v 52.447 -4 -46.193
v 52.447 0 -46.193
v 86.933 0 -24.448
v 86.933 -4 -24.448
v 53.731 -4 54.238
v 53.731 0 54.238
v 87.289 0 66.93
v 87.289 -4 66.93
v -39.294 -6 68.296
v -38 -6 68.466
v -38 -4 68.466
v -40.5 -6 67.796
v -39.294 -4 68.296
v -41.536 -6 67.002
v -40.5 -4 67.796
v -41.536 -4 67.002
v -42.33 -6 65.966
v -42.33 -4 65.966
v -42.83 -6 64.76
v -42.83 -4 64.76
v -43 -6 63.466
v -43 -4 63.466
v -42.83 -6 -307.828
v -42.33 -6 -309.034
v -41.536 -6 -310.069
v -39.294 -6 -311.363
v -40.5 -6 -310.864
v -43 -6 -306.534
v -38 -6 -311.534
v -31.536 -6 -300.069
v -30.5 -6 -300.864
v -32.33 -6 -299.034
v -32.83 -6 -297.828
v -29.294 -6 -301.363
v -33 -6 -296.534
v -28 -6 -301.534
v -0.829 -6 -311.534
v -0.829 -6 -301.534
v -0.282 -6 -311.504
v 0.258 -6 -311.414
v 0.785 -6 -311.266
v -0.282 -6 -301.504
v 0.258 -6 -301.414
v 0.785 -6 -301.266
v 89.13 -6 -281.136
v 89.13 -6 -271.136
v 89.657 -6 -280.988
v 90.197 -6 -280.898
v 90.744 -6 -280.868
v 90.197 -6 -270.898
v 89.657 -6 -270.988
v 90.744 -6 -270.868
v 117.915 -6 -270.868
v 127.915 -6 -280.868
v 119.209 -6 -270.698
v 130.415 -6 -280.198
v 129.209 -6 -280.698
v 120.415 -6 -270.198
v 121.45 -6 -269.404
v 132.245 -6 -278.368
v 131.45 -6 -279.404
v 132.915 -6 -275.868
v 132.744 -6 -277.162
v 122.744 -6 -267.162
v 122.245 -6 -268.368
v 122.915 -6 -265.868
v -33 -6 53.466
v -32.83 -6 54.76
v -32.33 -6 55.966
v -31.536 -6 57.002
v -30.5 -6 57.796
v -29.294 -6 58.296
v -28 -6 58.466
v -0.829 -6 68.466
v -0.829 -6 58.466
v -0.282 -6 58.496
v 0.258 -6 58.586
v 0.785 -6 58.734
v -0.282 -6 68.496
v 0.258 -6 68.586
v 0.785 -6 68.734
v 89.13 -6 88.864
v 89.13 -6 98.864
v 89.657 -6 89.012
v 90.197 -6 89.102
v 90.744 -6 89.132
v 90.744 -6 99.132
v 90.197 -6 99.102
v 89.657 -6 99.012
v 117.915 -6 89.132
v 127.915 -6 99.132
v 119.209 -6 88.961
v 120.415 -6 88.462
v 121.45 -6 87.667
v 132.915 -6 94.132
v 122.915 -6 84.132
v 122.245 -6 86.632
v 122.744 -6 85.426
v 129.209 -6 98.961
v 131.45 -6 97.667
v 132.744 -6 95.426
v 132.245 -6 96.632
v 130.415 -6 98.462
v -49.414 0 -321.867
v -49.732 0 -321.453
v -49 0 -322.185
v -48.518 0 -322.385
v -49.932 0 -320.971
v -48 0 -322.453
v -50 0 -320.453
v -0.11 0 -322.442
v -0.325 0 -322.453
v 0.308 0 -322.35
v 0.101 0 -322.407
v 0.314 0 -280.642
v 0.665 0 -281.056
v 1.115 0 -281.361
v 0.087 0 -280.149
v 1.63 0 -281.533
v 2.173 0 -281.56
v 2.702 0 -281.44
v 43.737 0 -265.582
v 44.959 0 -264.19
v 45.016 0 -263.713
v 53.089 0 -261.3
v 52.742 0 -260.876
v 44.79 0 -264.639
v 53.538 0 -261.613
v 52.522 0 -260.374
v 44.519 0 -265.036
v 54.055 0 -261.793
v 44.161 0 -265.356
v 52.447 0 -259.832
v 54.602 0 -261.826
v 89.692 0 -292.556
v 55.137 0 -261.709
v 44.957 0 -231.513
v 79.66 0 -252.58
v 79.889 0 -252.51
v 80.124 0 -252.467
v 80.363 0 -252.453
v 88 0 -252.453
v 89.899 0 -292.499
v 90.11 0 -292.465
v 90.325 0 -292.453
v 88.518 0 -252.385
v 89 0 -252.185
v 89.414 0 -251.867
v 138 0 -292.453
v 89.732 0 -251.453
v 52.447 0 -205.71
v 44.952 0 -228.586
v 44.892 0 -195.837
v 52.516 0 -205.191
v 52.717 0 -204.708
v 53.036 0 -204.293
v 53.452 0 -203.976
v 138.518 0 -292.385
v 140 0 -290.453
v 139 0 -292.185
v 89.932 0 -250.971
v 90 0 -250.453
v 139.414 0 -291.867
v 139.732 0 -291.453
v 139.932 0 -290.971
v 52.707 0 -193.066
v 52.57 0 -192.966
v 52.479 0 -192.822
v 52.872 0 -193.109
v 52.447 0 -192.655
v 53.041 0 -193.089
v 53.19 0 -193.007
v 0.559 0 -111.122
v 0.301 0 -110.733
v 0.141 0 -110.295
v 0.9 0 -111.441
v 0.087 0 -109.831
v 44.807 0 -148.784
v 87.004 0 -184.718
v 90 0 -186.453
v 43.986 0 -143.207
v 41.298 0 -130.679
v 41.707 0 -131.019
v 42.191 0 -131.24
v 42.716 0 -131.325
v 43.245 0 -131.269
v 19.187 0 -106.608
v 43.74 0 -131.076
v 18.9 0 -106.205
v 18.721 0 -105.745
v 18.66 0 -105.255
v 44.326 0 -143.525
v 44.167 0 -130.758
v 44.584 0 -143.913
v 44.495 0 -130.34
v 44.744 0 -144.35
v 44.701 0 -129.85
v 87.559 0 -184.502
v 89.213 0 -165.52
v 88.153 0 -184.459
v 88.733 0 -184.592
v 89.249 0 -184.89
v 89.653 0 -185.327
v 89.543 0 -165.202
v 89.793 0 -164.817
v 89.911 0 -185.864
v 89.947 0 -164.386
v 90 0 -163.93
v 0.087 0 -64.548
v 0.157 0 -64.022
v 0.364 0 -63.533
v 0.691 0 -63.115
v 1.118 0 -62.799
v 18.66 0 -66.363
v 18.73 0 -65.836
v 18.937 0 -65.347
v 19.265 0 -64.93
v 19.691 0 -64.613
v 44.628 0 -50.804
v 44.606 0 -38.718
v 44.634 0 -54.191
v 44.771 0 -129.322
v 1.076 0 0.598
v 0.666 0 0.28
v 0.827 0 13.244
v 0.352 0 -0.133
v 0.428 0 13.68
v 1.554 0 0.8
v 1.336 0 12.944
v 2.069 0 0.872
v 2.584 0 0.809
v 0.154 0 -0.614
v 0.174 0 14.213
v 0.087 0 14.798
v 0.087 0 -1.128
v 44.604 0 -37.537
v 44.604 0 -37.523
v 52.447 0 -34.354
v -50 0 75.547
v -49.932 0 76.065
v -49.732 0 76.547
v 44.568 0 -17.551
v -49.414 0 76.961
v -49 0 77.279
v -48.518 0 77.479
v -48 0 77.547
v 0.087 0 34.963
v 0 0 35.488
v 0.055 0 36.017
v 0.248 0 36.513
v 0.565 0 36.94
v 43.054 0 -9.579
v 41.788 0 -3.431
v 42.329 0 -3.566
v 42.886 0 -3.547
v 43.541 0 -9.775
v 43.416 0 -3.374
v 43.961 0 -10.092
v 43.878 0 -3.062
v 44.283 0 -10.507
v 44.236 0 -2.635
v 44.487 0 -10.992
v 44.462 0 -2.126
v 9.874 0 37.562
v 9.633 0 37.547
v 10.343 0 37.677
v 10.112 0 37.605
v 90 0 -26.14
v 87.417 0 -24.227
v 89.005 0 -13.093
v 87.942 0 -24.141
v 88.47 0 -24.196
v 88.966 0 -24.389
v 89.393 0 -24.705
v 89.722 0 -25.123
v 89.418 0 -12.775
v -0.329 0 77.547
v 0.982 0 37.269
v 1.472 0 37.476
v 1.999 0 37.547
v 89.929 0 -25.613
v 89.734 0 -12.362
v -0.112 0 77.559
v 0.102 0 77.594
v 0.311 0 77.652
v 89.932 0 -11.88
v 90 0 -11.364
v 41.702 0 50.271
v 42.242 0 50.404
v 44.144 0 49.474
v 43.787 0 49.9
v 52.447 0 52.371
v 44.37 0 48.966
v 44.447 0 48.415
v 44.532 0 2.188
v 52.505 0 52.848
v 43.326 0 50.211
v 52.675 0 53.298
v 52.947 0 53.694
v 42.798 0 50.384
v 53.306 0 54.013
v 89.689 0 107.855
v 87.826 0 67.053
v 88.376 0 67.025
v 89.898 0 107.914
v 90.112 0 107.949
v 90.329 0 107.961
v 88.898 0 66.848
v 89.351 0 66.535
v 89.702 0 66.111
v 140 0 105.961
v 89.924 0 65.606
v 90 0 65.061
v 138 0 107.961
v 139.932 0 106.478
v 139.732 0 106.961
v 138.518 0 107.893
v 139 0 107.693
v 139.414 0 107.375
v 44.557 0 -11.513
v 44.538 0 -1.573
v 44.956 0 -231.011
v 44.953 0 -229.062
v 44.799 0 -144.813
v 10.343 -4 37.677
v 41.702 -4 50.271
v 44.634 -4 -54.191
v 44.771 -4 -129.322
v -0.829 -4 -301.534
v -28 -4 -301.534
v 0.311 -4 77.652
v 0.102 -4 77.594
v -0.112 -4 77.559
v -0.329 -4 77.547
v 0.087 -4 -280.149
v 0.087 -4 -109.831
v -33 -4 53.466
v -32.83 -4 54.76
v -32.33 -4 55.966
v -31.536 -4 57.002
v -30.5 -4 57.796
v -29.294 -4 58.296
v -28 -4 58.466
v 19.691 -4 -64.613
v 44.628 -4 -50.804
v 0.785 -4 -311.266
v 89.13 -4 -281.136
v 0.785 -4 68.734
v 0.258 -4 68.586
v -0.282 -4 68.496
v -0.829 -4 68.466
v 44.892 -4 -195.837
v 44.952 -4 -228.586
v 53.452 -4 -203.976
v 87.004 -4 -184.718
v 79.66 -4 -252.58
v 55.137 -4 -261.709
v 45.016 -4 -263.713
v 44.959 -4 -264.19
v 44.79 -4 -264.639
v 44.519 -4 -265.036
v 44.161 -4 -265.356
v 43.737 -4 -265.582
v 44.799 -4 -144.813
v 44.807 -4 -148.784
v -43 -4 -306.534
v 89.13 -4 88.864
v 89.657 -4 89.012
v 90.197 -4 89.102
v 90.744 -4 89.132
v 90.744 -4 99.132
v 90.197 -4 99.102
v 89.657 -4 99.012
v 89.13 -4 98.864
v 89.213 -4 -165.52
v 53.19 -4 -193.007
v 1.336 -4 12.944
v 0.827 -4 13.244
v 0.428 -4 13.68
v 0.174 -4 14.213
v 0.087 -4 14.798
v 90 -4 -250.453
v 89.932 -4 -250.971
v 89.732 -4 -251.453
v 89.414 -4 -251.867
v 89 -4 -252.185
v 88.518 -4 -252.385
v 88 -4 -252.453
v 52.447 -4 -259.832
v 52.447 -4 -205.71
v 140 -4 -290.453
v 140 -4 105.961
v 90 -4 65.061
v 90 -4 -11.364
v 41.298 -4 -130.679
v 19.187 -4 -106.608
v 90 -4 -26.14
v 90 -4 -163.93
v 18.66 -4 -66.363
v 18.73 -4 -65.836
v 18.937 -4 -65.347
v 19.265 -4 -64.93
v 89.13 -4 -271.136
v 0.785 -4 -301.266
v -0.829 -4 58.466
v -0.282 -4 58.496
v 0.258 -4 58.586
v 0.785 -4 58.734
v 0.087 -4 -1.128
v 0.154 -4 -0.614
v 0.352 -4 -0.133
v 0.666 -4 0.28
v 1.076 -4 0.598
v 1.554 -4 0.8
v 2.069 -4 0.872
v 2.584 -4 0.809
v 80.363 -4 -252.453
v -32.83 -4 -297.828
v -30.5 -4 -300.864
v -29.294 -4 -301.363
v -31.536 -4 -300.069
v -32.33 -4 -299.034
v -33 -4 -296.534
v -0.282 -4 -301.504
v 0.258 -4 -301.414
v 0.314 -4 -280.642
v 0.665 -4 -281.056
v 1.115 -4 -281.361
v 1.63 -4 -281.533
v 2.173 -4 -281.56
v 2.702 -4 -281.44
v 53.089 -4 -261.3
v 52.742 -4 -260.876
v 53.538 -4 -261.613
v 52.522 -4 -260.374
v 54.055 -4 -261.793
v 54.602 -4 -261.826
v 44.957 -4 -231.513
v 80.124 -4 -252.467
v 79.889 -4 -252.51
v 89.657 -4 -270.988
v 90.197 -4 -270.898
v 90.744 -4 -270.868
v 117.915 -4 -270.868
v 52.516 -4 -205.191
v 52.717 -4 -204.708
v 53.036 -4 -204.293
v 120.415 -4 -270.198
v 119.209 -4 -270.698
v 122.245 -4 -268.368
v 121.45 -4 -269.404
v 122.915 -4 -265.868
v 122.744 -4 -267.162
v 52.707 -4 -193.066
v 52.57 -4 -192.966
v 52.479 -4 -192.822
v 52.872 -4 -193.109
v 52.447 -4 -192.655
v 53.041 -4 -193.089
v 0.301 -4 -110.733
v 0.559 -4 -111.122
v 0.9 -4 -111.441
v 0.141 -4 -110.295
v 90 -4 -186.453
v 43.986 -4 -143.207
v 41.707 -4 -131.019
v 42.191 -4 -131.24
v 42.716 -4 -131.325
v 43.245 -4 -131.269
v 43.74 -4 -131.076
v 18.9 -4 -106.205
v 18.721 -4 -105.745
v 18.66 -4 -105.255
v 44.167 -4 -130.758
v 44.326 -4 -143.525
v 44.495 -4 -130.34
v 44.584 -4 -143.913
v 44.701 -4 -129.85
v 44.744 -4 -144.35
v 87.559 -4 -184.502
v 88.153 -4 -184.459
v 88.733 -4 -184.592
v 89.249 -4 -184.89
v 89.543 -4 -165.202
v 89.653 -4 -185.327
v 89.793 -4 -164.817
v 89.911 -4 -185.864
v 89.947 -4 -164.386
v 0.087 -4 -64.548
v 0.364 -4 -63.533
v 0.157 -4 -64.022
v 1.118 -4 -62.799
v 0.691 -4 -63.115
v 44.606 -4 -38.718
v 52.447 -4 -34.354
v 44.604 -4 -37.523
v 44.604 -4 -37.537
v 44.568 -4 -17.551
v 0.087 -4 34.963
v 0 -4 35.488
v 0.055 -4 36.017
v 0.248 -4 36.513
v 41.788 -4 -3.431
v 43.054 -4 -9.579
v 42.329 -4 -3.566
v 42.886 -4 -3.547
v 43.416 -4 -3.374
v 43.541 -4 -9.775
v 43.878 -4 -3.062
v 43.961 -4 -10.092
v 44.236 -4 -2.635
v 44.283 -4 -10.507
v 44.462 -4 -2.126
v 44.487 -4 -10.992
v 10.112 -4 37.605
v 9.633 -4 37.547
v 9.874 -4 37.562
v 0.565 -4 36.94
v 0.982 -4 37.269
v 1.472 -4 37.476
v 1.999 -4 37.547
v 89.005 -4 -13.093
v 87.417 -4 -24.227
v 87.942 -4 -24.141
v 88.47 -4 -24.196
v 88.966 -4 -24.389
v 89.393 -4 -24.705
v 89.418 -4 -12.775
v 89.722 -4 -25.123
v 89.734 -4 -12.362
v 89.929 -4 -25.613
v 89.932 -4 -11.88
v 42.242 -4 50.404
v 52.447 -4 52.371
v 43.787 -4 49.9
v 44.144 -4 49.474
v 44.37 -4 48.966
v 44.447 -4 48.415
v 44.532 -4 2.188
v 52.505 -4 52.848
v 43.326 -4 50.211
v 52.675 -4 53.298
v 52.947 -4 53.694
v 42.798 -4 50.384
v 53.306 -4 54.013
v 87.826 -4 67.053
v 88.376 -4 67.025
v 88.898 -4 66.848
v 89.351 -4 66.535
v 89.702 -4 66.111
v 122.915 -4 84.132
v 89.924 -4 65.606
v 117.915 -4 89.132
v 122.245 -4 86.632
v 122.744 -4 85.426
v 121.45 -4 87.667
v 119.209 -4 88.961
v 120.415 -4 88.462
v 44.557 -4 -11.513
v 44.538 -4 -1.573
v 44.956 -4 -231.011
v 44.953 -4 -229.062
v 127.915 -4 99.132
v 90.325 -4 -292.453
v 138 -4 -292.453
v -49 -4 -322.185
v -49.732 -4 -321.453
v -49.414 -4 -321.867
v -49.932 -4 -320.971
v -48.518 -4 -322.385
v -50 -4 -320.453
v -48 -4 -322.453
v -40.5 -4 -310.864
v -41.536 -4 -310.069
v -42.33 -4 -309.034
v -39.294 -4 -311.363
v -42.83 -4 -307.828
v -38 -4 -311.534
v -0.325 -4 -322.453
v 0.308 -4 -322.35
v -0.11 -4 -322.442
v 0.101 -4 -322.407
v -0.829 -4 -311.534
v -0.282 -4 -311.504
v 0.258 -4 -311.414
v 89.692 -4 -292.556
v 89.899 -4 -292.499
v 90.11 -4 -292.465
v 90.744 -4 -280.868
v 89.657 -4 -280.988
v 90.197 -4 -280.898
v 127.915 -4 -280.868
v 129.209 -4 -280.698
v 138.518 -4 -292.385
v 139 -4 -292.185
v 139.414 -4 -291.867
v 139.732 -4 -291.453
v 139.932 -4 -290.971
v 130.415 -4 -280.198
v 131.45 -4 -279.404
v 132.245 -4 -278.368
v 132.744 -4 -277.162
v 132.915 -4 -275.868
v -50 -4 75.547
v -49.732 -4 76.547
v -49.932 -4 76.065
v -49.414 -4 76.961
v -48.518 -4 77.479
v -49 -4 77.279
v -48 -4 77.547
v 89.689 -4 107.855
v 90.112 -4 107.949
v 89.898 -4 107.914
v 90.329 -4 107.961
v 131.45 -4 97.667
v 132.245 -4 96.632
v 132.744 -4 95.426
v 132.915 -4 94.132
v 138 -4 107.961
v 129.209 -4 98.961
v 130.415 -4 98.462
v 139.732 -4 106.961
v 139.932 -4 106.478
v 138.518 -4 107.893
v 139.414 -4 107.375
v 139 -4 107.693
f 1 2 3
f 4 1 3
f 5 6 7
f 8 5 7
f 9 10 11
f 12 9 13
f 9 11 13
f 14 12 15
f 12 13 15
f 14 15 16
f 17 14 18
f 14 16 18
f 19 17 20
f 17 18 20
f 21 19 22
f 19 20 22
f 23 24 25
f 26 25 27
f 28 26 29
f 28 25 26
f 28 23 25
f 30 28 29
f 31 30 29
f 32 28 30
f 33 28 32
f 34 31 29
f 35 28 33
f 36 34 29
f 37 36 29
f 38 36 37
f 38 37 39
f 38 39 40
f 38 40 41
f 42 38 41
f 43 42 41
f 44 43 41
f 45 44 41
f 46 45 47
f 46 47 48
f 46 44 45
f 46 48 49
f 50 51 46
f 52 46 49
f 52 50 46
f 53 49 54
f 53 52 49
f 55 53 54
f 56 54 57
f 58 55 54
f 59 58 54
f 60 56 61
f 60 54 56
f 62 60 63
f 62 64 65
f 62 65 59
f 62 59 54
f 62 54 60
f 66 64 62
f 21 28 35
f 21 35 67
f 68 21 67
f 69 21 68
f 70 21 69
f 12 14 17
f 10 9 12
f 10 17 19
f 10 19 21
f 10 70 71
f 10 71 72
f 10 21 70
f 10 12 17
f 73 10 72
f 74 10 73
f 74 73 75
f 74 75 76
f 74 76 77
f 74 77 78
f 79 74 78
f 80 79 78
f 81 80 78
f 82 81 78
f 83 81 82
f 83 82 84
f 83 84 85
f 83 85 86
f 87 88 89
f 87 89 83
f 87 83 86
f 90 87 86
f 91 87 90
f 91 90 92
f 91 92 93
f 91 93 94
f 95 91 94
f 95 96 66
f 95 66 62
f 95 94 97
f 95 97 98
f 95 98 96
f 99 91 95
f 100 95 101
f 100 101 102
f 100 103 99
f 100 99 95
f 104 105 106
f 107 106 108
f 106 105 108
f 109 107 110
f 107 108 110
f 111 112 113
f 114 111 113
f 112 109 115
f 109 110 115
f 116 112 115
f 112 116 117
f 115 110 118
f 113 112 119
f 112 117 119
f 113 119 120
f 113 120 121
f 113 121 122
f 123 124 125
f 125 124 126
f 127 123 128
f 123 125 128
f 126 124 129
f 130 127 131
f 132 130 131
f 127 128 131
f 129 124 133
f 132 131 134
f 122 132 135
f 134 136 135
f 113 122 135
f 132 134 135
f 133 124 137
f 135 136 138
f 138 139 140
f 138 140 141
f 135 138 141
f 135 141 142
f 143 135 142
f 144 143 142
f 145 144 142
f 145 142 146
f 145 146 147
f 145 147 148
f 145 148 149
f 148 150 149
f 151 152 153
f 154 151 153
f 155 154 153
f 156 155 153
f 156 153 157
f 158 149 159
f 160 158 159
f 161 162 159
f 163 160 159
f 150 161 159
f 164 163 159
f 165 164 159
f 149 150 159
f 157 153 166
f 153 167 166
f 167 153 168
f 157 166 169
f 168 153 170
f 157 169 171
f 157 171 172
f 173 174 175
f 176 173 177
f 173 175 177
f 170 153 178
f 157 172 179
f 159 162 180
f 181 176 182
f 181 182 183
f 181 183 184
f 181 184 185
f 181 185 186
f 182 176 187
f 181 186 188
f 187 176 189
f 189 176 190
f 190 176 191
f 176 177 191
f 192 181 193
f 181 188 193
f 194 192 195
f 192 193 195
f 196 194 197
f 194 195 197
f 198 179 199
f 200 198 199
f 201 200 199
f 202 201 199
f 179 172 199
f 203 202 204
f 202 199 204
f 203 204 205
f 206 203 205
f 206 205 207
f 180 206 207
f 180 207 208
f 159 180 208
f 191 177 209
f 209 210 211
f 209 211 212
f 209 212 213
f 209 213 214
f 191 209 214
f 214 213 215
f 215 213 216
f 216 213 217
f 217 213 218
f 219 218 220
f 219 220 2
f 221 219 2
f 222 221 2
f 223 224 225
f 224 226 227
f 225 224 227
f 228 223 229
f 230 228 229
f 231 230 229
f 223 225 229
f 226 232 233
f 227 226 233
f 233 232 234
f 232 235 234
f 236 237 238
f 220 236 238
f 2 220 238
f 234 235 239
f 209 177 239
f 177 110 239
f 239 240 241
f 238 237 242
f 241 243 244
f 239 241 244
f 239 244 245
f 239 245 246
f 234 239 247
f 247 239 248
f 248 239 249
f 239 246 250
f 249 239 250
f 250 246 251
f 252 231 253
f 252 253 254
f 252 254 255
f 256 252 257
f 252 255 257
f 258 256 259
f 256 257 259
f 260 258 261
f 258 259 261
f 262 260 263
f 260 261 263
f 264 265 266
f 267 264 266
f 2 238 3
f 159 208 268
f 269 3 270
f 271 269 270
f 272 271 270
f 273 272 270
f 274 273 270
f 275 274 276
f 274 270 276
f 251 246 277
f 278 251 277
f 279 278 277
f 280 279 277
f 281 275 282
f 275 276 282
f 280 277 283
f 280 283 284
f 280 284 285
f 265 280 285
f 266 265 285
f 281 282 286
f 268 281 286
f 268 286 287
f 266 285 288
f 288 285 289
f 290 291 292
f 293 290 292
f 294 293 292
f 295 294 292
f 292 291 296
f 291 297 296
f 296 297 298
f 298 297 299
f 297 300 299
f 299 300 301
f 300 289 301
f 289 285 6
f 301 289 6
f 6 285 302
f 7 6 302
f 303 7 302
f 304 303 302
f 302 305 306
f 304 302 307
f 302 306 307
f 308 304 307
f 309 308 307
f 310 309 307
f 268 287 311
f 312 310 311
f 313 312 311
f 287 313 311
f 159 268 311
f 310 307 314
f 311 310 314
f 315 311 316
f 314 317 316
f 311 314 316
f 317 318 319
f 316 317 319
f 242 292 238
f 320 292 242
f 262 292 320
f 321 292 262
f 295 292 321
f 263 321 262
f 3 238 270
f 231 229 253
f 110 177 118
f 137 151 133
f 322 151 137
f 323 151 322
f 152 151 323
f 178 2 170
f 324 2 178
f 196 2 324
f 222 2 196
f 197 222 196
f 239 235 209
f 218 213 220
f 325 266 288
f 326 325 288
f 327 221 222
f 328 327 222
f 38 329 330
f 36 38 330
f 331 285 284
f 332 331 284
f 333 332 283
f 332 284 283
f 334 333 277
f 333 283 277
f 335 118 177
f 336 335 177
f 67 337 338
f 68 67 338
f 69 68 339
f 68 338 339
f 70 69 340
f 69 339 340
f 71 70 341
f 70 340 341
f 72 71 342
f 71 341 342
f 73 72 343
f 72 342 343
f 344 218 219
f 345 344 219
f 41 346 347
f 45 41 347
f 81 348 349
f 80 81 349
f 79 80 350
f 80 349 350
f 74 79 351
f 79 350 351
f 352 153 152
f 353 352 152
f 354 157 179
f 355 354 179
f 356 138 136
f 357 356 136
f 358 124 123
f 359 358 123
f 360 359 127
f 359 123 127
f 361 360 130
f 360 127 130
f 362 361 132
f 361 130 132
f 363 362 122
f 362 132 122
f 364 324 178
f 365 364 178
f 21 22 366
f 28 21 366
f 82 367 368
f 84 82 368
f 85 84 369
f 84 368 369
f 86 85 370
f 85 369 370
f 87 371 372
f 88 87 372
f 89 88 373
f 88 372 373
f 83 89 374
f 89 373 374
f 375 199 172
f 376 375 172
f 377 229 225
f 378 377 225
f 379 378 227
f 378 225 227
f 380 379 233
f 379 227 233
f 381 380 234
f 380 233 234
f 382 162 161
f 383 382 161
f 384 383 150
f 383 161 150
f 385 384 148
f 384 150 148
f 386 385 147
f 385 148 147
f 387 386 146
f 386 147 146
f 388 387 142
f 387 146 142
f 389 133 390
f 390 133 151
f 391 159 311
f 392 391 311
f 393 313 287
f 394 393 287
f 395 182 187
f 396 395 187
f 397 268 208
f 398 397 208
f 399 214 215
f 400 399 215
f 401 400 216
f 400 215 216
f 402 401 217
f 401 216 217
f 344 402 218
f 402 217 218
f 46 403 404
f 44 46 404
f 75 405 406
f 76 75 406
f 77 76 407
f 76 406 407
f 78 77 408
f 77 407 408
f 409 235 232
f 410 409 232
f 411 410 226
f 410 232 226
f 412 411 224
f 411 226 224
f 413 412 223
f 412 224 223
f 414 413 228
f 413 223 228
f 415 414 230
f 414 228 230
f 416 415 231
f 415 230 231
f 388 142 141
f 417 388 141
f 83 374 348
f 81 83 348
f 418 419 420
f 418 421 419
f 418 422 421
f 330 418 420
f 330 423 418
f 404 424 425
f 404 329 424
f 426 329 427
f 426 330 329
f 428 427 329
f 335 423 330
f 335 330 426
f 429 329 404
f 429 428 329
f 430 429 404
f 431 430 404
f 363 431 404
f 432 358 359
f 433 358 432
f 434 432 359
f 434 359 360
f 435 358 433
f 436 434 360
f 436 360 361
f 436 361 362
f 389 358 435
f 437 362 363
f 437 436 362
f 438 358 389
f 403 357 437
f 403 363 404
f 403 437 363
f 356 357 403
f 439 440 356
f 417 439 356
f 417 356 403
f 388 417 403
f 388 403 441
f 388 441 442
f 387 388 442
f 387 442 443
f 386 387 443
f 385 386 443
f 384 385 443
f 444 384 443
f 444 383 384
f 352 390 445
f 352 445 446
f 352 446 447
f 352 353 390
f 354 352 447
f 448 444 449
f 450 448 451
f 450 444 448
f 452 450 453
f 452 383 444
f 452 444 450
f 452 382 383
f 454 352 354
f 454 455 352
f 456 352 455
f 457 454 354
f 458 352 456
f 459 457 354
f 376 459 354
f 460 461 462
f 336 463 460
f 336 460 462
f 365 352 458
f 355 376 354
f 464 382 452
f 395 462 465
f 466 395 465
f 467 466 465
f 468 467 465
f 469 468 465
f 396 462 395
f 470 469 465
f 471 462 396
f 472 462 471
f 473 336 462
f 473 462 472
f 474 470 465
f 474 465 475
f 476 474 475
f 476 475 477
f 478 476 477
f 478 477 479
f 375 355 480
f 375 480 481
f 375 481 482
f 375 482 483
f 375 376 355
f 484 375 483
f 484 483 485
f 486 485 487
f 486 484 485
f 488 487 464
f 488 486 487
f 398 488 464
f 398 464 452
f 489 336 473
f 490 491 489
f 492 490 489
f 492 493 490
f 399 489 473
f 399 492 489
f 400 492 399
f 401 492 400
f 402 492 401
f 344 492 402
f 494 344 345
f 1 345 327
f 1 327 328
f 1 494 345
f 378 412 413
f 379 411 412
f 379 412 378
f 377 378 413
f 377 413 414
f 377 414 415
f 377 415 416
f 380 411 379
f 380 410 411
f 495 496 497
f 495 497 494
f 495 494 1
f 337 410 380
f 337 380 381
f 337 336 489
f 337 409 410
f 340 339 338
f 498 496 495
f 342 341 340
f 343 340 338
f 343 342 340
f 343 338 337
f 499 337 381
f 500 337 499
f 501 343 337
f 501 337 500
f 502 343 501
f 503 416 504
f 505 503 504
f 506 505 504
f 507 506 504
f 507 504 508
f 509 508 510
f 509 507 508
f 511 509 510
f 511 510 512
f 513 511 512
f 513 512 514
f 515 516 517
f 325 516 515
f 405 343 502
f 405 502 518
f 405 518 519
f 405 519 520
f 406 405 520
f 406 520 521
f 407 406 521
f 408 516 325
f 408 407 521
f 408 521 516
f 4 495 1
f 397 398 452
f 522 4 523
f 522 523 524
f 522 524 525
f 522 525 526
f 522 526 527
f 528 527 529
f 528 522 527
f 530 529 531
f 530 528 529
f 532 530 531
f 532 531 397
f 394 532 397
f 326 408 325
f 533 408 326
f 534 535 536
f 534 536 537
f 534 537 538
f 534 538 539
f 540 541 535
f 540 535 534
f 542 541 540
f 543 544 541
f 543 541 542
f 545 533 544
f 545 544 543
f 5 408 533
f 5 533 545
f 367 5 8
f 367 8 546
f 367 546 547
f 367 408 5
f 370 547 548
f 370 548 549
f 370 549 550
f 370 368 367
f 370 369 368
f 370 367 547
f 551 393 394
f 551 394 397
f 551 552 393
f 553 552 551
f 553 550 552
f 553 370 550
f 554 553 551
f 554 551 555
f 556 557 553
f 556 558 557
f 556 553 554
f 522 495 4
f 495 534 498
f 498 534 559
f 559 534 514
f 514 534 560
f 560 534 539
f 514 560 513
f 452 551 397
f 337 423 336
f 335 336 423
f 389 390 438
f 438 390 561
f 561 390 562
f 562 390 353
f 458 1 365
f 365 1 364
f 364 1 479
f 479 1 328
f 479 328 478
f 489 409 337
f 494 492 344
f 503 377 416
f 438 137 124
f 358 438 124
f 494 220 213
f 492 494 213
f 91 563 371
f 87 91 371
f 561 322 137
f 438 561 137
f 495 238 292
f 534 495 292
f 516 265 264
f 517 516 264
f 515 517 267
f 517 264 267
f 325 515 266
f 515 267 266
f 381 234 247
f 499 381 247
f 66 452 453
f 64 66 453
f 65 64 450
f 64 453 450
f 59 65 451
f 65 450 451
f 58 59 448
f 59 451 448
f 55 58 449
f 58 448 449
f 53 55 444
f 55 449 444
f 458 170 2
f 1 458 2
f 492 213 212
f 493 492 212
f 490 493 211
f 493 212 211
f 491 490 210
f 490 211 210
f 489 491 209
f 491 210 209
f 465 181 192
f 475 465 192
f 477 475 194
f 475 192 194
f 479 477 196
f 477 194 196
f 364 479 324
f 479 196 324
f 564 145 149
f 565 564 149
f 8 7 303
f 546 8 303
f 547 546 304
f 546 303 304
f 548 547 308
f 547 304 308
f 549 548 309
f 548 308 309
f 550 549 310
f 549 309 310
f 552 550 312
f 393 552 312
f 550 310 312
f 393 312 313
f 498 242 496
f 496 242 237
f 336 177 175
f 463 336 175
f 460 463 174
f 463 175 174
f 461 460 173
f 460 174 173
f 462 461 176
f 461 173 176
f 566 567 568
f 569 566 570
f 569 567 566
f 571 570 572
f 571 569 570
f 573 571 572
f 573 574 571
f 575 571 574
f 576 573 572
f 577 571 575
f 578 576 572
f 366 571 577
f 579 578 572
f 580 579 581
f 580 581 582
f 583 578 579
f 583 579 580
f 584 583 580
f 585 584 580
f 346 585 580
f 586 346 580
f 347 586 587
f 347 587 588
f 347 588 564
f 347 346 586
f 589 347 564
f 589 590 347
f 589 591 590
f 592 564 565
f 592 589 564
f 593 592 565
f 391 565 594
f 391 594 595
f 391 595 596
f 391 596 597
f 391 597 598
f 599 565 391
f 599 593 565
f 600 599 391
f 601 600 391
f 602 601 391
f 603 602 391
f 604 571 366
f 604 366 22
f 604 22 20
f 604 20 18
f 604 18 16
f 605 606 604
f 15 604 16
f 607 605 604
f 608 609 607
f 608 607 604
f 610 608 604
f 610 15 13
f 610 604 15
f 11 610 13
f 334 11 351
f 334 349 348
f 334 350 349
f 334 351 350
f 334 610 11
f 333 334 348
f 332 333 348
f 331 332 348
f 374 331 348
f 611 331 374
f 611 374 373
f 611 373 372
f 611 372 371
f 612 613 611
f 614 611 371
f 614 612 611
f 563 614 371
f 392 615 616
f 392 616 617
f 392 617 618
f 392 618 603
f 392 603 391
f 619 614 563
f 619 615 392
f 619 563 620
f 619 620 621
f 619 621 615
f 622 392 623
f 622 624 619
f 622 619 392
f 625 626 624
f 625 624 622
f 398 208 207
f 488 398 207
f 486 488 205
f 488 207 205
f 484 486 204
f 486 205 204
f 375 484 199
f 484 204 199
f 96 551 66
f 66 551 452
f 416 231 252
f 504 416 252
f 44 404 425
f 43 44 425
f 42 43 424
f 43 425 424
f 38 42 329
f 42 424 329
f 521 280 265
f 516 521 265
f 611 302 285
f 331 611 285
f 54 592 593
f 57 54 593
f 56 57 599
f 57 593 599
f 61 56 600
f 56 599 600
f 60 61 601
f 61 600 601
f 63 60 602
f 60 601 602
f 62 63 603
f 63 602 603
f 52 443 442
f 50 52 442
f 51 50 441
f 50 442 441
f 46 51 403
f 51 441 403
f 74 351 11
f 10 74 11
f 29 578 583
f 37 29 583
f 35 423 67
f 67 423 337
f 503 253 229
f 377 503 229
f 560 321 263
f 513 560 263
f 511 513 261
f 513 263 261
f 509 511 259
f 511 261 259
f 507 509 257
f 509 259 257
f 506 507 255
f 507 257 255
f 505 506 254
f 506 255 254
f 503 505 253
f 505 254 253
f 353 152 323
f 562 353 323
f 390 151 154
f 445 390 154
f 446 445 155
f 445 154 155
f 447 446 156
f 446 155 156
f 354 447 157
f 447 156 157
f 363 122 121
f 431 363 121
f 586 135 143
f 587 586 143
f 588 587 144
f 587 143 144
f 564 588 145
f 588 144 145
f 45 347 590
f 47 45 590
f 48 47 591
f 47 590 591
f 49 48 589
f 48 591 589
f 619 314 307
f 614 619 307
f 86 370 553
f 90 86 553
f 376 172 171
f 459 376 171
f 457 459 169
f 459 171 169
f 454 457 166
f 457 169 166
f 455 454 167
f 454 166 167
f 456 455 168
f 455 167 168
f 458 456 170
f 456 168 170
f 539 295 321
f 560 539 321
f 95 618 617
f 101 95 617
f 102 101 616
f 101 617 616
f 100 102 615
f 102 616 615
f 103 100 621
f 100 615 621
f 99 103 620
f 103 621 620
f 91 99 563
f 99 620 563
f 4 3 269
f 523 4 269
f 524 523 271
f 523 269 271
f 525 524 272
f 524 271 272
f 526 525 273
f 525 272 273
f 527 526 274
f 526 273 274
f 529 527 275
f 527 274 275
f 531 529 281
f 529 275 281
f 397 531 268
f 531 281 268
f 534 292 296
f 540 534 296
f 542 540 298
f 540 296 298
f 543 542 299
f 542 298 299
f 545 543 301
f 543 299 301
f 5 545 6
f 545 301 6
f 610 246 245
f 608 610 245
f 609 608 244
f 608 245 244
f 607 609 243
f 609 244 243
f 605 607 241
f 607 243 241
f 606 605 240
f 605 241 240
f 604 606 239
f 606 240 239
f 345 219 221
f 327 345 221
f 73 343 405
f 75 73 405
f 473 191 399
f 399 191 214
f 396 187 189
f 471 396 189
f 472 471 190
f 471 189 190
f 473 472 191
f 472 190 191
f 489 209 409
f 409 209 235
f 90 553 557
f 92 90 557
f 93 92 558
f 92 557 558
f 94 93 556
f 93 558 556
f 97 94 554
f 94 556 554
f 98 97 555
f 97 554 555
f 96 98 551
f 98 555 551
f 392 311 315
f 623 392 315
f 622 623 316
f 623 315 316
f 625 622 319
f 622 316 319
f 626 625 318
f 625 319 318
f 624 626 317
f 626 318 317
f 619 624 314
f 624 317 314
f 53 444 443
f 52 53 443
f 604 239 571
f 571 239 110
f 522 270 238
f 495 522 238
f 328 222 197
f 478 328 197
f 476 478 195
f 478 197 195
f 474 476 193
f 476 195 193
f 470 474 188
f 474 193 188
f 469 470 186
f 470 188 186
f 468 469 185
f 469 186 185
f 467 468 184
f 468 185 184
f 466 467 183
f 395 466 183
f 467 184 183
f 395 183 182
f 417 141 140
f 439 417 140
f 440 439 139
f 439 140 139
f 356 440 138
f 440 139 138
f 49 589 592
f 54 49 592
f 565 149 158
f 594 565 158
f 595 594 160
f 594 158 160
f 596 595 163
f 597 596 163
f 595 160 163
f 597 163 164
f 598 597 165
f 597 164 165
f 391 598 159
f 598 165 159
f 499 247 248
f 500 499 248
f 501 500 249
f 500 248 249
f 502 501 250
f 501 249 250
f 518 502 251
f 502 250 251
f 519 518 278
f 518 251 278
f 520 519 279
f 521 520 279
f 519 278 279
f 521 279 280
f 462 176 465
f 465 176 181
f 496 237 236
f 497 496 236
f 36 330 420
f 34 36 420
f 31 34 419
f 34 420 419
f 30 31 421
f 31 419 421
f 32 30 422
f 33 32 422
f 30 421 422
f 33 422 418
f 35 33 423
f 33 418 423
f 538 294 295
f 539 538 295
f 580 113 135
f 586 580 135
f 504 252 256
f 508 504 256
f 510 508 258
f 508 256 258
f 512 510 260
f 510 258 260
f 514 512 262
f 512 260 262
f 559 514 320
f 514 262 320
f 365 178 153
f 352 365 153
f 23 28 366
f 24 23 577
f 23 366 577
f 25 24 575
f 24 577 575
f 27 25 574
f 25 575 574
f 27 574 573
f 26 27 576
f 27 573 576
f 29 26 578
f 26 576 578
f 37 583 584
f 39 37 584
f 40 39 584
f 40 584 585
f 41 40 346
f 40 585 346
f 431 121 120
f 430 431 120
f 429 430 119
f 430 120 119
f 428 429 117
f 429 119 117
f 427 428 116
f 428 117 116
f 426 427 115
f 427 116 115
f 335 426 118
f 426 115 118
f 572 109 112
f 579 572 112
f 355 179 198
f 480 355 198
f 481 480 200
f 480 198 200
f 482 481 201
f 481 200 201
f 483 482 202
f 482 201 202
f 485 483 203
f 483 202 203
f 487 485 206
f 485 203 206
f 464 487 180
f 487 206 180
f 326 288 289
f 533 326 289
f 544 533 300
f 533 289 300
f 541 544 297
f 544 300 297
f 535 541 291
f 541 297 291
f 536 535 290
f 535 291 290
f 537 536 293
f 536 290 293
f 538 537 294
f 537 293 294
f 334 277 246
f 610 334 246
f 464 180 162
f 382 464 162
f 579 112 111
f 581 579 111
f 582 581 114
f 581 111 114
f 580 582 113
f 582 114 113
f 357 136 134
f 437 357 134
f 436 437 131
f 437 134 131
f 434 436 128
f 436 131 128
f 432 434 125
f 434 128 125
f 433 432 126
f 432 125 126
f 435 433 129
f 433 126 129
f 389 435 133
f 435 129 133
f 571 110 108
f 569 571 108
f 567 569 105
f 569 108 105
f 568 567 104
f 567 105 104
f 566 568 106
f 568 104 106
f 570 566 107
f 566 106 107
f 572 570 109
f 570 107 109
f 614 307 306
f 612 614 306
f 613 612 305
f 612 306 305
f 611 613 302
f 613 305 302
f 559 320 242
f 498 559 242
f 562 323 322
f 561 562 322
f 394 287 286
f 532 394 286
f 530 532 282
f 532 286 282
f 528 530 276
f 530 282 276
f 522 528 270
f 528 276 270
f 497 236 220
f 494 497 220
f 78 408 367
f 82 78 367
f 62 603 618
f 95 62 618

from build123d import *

# Parameters (mm, degrees)
F1_DEPTH = 4
F3_DEPTH = 6


with BuildPart() as f1:
    # F0 (on Front) → F1 (new body)
    with BuildSketch(Plane.XZ):
        with BuildLine():
            ThreePointArc((0.311493, 77.652204), (-0.004355, 77.573432), (-0.328798, 77.54694))
            Line((-0.328798, 77.54694), (-48, 77.54694))
            ThreePointArc((-48, 77.54694), (-49.414214, 76.961154), (-50, 75.54694))
            Line((-50, 75.54694), (-50, -320.45306))
            ThreePointArc((-50, -320.45306), (-49.414214, -321.867273), (-48, -322.45306))
            Line((-48, -322.45306), (-0.324555, -322.45306))
            ThreePointArc((-0.324555, -322.45306), (-0.004191, -322.427235), (0.3079, -322.350426))
            Line((0.3079, -322.350426), (89.6921, -292.555693))
            ThreePointArc((89.6921, -292.555693), (90.004191, -292.478885), (90.324555, -292.45306))
            Line((90.324555, -292.45306), (138, -292.45306))
            ThreePointArc((138, -292.45306), (139.414214, -291.867273), (140, -290.45306))
            Line((140, -290.45306), (140, 105.960753))
            ThreePointArc((140, 105.960753), (139.414214, 107.374967), (138, 107.960753))
            Line((138, 107.960753), (90.328798, 107.960753))
            ThreePointArc((90.328798, 107.960753), (90.004355, 107.934262), (89.688507, 107.85549))
            Line((89.688507, 107.85549), (0.311493, 77.652204))
        make_face()
        with BuildLine():
            ThreePointArc((0.08659, 34.963099), (0.392042, 36.736965), (1.999475, 37.54694))
            Line((1.999475, 37.54694), (9.632653, 37.54694))
            ThreePointArc((9.632653, 37.54694), (9.993956, 37.579846), (10.34337, 37.67748))
            Line((10.34337, 37.67748), (41.702027, 50.270872))
            ThreePointArc((41.702027, 50.270872), (43.567476, 50.071842), (44.447355, 48.414939))
            Line((44.447355, 48.414939), (44.531555, 2.188108))
            Line((44.531555, 2.188108), (44.538406, -1.573441))
            Line((44.538406, -1.573441), (44.55651, -11.512594))
            Line((44.55651, -11.512594), (44.567509, -17.551468))
            Line((44.567509, -17.551468), (44.603887, -37.523114))
            Line((44.603887, -37.523114), (44.603911, -37.536671))
            Line((44.603911, -37.536671), (44.606063, -38.717808))
            Line((44.606063, -38.717808), (44.628078, -50.804465))
            Line((44.628078, -50.804465), (44.634246, -54.191019))
            Line((44.634246, -54.191019), (44.771094, -129.322448))
            Line((44.771094, -129.322448), (44.799309, -144.812723))
            Line((44.799309, -144.812723), (44.806541, -148.783601))
            Line((44.806541, -148.783601), (44.892246, -195.836749))
            Line((44.892246, -195.836749), (44.951897, -228.585603))
            Line((44.951897, -228.585603), (44.952764, -229.062129))
            Line((44.952764, -229.062129), (44.956313, -231.010533))
            Line((44.956313, -231.010533), (44.957229, -231.513005))
            Line((44.957229, -231.513005), (45.015878, -263.712596))
            ThreePointArc((45.015878, -263.712596), (44.666439, -264.84569), (43.736825, -265.581779))
            Line((43.736825, -265.581779), (2.702247, -281.439717))
            ThreePointArc((2.702247, -281.439717), (1.115069, -281.36063), (0.08659, -280.149176))
            Line((0.08659, -280.149176), (0.08659, -213.666722))
            Line((0.08659, -213.666722), (0.08659, -213.666518))
            Line((0.08659, -213.666518), (0.08659, -109.831086))
            Line((0.08659, -109.831086), (0.08659, -64.548373))
            Line((0.08659, -64.548373), (0.08659, -3.747635))
            Line((0.08659, -3.747635), (0.08659, -1.128253))
            Line((0.08659, -1.128253), (0.08659, 14.797802))
            Line((0.08659, 14.797802), (0.08659, 18.424725))
            Line((0.08659, 18.424725), (0.08659, 34.963099))
        make_face(mode=Mode.SUBTRACT)
        with BuildLine():
            ThreePointArc((90, -250.45306), (89.414214, -251.867273), (88, -252.45306))
            Line((88, -252.45306), (80.362669, -252.45306))
            ThreePointArc((80.362669, -252.45306), (80.00582, -252.485153), (79.660422, -252.580401))
            Line((79.660422, -252.580401), (55.136718, -261.70943))
            ThreePointArc((55.136718, -261.70943), (53.302525, -261.471919), (52.447355, -259.831991))
            Line((52.447355, -259.831991), (52.447355, -208.675399))
            Line((52.447355, -208.675399), (52.447355, -205.710266))
            Line((52.447355, -205.710266), (52.447355, -192.655353))
            Line((52.447355, -192.655353), (52.447355, -191.636056))
            Line((52.447355, -191.636056), (52.447355, -46.193009))
            Line((52.447355, -46.193009), (52.447355, -34.354303))
            Line((52.447355, -34.354303), (52.447355, 52.370707))
            ThreePointArc((52.447355, 52.370707), (52.799274, 53.503769), (53.731183, 54.238084))
            Line((53.731183, 54.238084), (87.289282, 66.930212))
            ThreePointArc((87.289282, 66.930212), (89.135466, 66.707178), (90, 65.060752))
            Line((90, 65.060752), (90, -10.053347))
            Line((90, -10.053347), (90, -11.364244))
            Line((90, -11.364244), (90, -26.140187))
            Line((90, -26.140187), (90, -29.092925))
            Line((90, -29.092925), (90, -158.712357))
            Line((90, -158.712357), (90, -163.930135))
            Line((90, -163.930135), (90, -186.452676))
            Line((90, -186.452676), (90, -189.093262))
            Line((90, -189.093262), (90, -250.45306))
        make_face(mode=Mode.SUBTRACT)
        with BuildLine():
            ThreePointArc((86.933276, -24.448412), (88.966062, -24.38898), (90, -26.140187))
            Line((90, -26.140187), (90, -11.364244))
            ThreePointArc((90, -11.364244), (89.733629, -12.361506), (89.005469, -13.093126))
            Line((89.005469, -13.093126), (52.447355, -34.354303))
            Line((52.447355, -34.354303), (52.447355, -46.193009))
            Line((52.447355, -46.193009), (86.933276, -24.448412))
        make_face()
        with BuildLine():
            ThreePointArc((1.336144, 12.943933), (0.428143, 13.679967), (0.08659, 14.797802))
            Line((0.08659, 14.797802), (0.08659, -1.128253))
            ThreePointArc((0.08659, -1.128253), (0.860722, 0.452015), (2.583838, 0.808947))
            Line((2.583838, 0.808947), (43.053761, -9.579037))
            ThreePointArc((43.053761, -9.579037), (44.135664, -10.288931), (44.55651, -11.512594))
            Line((44.55651, -11.512594), (44.538406, -1.573441))
            ThreePointArc((44.538406, -1.573441), (43.657754, -3.234512), (41.787964, -3.430953))
            Line((41.787964, -3.430953), (1.336144, 12.943933))
        make_face()
        with BuildLine():
            ThreePointArc((1.117742, -62.798706), (0.363555, -63.532917), (0.08659, -64.548373))
            Line((0.08659, -64.548373), (0.08659, -109.831086))
            ThreePointArc((0.08659, -109.831086), (0.30142, -110.732846), (0.89976, -111.44088))
            Line((0.89976, -111.44088), (43.986142, -143.206573))
            ThreePointArc((43.986142, -143.206573), (44.583659, -143.912981), (44.799309, -144.812723))
            Line((44.799309, -144.812723), (44.771094, -129.322448))
            ThreePointArc((44.771094, -129.322448), (43.498808, -131.189002), (41.298194, -130.679071))
            Line((41.298194, -130.679071), (19.18674, -106.607738))
            ThreePointArc((19.18674, -106.607738), (18.796071, -105.980772), (18.659644, -105.254758))
            Line((18.659644, -105.254758), (18.659644, -66.362716))
            ThreePointArc((18.659644, -66.362716), (18.936609, -65.347259), (19.690796, -64.613049))
            Line((19.690796, -64.613049), (44.628078, -50.804465))
            Line((44.628078, -50.804465), (44.606063, -38.717808))
            Line((44.606063, -38.717808), (1.117742, -62.798706))
        make_face()
        with BuildLine():
            ThreePointArc((87.004425, -184.718078), (89.00221, -184.721903), (90, -186.452676))
            Line((90, -186.452676), (90, -163.930135))
            ThreePointArc((90, -163.930135), (89.792549, -164.817134), (89.213233, -165.520124))
            Line((89.213233, -165.520124), (53.189984, -193.007491))
            ThreePointArc((53.189984, -193.007491), (52.707297, -193.066297), (52.447355, -192.655353))
            Line((52.447355, -192.655353), (52.447355, -205.710266))
            ThreePointArc((52.447355, -205.710266), (52.716582, -204.708056), (53.45178, -203.975668))
            Line((53.45178, -203.975668), (87.004425, -184.718078))
        make_face()
    extrude(amount=F1_DEPTH)

    # F2 (on face) → F3 (join)
    with BuildSketch(Plane.XZ):
        with BuildLine():
            Line((132.914576, -275.868222), (132.914576, 94.131778))
            ThreePointArc((132.914576, 94.131778), (131.45011, 97.667312), (127.914576, 99.131778))
            Line((127.914576, 99.131778), (90.743754, 99.131778))
            ThreePointArc((90.743754, 99.131778), (89.925748, 99.064411), (89.129784, 98.864124))
            Line((89.129784, 98.864124), (0.784792, 68.733994))
            ThreePointArc((0.784792, 68.733994), (-0.011172, 68.533708), (-0.829178, 68.46634))
            Line((-0.829178, 68.46634), (-38, 68.46634))
            ThreePointArc((-38, 68.46634), (-41.535534, 67.001874), (-43, 63.46634))
            Line((-43, 63.46634), (-43, -306.53366))
            ThreePointArc((-43, -306.53366), (-41.535534, -310.069194), (-38, -311.53366))
            Line((-38, -311.53366), (-0.829178, -311.53366))
            ThreePointArc((-0.829178, -311.53366), (-0.011172, -311.466292), (0.784792, -311.266006))
            Line((0.784792, -311.266006), (89.129784, -281.135876))
            ThreePointArc((89.129784, -281.135876), (89.925748, -280.935589), (90.743754, -280.868222))
            Line((90.743754, -280.868222), (127.914576, -280.868222))
            ThreePointArc((127.914576, -280.868222), (131.45011, -279.403756), (132.914576, -275.868222))
        make_face()
        with BuildLine():
            ThreePointArc((122.914576, -265.868222), (121.45011, -269.403756), (117.914576, -270.868222))
            Line((117.914576, -270.868222), (90.743754, -270.868222))
            ThreePointArc((90.743754, -270.868222), (89.925748, -270.935589), (89.129784, -271.135876))
            Line((89.129784, -271.135876), (0.784792, -301.266006))
            ThreePointArc((0.784792, -301.266006), (-0.011172, -301.466292), (-0.829178, -301.53366))
            Line((-0.829178, -301.53366), (-28, -301.53366))
            ThreePointArc((-28, -301.53366), (-31.535534, -300.069194), (-33, -296.53366))
            Line((-33, -296.53366), (-33, 53.46634))
            ThreePointArc((-33, 53.46634), (-31.535534, 57.001874), (-28, 58.46634))
            Line((-28, 58.46634), (-0.829178, 58.46634))
            ThreePointArc((-0.829178, 58.46634), (-0.011172, 58.533708), (0.784792, 58.733994))
            Line((0.784792, 58.733994), (89.129784, 88.864124))
            ThreePointArc((89.129784, 88.864124), (89.925748, 89.064411), (90.743754, 89.131778))
            Line((90.743754, 89.131778), (117.914576, 89.131778))
            ThreePointArc((117.914576, 89.131778), (121.45011, 87.667312), (122.914576, 84.131778))
            Line((122.914576, 84.131778), (122.914576, -265.868222))
        make_face(mode=Mode.SUBTRACT)
    extrude(amount=F3_DEPTH)


solid = f1.part
